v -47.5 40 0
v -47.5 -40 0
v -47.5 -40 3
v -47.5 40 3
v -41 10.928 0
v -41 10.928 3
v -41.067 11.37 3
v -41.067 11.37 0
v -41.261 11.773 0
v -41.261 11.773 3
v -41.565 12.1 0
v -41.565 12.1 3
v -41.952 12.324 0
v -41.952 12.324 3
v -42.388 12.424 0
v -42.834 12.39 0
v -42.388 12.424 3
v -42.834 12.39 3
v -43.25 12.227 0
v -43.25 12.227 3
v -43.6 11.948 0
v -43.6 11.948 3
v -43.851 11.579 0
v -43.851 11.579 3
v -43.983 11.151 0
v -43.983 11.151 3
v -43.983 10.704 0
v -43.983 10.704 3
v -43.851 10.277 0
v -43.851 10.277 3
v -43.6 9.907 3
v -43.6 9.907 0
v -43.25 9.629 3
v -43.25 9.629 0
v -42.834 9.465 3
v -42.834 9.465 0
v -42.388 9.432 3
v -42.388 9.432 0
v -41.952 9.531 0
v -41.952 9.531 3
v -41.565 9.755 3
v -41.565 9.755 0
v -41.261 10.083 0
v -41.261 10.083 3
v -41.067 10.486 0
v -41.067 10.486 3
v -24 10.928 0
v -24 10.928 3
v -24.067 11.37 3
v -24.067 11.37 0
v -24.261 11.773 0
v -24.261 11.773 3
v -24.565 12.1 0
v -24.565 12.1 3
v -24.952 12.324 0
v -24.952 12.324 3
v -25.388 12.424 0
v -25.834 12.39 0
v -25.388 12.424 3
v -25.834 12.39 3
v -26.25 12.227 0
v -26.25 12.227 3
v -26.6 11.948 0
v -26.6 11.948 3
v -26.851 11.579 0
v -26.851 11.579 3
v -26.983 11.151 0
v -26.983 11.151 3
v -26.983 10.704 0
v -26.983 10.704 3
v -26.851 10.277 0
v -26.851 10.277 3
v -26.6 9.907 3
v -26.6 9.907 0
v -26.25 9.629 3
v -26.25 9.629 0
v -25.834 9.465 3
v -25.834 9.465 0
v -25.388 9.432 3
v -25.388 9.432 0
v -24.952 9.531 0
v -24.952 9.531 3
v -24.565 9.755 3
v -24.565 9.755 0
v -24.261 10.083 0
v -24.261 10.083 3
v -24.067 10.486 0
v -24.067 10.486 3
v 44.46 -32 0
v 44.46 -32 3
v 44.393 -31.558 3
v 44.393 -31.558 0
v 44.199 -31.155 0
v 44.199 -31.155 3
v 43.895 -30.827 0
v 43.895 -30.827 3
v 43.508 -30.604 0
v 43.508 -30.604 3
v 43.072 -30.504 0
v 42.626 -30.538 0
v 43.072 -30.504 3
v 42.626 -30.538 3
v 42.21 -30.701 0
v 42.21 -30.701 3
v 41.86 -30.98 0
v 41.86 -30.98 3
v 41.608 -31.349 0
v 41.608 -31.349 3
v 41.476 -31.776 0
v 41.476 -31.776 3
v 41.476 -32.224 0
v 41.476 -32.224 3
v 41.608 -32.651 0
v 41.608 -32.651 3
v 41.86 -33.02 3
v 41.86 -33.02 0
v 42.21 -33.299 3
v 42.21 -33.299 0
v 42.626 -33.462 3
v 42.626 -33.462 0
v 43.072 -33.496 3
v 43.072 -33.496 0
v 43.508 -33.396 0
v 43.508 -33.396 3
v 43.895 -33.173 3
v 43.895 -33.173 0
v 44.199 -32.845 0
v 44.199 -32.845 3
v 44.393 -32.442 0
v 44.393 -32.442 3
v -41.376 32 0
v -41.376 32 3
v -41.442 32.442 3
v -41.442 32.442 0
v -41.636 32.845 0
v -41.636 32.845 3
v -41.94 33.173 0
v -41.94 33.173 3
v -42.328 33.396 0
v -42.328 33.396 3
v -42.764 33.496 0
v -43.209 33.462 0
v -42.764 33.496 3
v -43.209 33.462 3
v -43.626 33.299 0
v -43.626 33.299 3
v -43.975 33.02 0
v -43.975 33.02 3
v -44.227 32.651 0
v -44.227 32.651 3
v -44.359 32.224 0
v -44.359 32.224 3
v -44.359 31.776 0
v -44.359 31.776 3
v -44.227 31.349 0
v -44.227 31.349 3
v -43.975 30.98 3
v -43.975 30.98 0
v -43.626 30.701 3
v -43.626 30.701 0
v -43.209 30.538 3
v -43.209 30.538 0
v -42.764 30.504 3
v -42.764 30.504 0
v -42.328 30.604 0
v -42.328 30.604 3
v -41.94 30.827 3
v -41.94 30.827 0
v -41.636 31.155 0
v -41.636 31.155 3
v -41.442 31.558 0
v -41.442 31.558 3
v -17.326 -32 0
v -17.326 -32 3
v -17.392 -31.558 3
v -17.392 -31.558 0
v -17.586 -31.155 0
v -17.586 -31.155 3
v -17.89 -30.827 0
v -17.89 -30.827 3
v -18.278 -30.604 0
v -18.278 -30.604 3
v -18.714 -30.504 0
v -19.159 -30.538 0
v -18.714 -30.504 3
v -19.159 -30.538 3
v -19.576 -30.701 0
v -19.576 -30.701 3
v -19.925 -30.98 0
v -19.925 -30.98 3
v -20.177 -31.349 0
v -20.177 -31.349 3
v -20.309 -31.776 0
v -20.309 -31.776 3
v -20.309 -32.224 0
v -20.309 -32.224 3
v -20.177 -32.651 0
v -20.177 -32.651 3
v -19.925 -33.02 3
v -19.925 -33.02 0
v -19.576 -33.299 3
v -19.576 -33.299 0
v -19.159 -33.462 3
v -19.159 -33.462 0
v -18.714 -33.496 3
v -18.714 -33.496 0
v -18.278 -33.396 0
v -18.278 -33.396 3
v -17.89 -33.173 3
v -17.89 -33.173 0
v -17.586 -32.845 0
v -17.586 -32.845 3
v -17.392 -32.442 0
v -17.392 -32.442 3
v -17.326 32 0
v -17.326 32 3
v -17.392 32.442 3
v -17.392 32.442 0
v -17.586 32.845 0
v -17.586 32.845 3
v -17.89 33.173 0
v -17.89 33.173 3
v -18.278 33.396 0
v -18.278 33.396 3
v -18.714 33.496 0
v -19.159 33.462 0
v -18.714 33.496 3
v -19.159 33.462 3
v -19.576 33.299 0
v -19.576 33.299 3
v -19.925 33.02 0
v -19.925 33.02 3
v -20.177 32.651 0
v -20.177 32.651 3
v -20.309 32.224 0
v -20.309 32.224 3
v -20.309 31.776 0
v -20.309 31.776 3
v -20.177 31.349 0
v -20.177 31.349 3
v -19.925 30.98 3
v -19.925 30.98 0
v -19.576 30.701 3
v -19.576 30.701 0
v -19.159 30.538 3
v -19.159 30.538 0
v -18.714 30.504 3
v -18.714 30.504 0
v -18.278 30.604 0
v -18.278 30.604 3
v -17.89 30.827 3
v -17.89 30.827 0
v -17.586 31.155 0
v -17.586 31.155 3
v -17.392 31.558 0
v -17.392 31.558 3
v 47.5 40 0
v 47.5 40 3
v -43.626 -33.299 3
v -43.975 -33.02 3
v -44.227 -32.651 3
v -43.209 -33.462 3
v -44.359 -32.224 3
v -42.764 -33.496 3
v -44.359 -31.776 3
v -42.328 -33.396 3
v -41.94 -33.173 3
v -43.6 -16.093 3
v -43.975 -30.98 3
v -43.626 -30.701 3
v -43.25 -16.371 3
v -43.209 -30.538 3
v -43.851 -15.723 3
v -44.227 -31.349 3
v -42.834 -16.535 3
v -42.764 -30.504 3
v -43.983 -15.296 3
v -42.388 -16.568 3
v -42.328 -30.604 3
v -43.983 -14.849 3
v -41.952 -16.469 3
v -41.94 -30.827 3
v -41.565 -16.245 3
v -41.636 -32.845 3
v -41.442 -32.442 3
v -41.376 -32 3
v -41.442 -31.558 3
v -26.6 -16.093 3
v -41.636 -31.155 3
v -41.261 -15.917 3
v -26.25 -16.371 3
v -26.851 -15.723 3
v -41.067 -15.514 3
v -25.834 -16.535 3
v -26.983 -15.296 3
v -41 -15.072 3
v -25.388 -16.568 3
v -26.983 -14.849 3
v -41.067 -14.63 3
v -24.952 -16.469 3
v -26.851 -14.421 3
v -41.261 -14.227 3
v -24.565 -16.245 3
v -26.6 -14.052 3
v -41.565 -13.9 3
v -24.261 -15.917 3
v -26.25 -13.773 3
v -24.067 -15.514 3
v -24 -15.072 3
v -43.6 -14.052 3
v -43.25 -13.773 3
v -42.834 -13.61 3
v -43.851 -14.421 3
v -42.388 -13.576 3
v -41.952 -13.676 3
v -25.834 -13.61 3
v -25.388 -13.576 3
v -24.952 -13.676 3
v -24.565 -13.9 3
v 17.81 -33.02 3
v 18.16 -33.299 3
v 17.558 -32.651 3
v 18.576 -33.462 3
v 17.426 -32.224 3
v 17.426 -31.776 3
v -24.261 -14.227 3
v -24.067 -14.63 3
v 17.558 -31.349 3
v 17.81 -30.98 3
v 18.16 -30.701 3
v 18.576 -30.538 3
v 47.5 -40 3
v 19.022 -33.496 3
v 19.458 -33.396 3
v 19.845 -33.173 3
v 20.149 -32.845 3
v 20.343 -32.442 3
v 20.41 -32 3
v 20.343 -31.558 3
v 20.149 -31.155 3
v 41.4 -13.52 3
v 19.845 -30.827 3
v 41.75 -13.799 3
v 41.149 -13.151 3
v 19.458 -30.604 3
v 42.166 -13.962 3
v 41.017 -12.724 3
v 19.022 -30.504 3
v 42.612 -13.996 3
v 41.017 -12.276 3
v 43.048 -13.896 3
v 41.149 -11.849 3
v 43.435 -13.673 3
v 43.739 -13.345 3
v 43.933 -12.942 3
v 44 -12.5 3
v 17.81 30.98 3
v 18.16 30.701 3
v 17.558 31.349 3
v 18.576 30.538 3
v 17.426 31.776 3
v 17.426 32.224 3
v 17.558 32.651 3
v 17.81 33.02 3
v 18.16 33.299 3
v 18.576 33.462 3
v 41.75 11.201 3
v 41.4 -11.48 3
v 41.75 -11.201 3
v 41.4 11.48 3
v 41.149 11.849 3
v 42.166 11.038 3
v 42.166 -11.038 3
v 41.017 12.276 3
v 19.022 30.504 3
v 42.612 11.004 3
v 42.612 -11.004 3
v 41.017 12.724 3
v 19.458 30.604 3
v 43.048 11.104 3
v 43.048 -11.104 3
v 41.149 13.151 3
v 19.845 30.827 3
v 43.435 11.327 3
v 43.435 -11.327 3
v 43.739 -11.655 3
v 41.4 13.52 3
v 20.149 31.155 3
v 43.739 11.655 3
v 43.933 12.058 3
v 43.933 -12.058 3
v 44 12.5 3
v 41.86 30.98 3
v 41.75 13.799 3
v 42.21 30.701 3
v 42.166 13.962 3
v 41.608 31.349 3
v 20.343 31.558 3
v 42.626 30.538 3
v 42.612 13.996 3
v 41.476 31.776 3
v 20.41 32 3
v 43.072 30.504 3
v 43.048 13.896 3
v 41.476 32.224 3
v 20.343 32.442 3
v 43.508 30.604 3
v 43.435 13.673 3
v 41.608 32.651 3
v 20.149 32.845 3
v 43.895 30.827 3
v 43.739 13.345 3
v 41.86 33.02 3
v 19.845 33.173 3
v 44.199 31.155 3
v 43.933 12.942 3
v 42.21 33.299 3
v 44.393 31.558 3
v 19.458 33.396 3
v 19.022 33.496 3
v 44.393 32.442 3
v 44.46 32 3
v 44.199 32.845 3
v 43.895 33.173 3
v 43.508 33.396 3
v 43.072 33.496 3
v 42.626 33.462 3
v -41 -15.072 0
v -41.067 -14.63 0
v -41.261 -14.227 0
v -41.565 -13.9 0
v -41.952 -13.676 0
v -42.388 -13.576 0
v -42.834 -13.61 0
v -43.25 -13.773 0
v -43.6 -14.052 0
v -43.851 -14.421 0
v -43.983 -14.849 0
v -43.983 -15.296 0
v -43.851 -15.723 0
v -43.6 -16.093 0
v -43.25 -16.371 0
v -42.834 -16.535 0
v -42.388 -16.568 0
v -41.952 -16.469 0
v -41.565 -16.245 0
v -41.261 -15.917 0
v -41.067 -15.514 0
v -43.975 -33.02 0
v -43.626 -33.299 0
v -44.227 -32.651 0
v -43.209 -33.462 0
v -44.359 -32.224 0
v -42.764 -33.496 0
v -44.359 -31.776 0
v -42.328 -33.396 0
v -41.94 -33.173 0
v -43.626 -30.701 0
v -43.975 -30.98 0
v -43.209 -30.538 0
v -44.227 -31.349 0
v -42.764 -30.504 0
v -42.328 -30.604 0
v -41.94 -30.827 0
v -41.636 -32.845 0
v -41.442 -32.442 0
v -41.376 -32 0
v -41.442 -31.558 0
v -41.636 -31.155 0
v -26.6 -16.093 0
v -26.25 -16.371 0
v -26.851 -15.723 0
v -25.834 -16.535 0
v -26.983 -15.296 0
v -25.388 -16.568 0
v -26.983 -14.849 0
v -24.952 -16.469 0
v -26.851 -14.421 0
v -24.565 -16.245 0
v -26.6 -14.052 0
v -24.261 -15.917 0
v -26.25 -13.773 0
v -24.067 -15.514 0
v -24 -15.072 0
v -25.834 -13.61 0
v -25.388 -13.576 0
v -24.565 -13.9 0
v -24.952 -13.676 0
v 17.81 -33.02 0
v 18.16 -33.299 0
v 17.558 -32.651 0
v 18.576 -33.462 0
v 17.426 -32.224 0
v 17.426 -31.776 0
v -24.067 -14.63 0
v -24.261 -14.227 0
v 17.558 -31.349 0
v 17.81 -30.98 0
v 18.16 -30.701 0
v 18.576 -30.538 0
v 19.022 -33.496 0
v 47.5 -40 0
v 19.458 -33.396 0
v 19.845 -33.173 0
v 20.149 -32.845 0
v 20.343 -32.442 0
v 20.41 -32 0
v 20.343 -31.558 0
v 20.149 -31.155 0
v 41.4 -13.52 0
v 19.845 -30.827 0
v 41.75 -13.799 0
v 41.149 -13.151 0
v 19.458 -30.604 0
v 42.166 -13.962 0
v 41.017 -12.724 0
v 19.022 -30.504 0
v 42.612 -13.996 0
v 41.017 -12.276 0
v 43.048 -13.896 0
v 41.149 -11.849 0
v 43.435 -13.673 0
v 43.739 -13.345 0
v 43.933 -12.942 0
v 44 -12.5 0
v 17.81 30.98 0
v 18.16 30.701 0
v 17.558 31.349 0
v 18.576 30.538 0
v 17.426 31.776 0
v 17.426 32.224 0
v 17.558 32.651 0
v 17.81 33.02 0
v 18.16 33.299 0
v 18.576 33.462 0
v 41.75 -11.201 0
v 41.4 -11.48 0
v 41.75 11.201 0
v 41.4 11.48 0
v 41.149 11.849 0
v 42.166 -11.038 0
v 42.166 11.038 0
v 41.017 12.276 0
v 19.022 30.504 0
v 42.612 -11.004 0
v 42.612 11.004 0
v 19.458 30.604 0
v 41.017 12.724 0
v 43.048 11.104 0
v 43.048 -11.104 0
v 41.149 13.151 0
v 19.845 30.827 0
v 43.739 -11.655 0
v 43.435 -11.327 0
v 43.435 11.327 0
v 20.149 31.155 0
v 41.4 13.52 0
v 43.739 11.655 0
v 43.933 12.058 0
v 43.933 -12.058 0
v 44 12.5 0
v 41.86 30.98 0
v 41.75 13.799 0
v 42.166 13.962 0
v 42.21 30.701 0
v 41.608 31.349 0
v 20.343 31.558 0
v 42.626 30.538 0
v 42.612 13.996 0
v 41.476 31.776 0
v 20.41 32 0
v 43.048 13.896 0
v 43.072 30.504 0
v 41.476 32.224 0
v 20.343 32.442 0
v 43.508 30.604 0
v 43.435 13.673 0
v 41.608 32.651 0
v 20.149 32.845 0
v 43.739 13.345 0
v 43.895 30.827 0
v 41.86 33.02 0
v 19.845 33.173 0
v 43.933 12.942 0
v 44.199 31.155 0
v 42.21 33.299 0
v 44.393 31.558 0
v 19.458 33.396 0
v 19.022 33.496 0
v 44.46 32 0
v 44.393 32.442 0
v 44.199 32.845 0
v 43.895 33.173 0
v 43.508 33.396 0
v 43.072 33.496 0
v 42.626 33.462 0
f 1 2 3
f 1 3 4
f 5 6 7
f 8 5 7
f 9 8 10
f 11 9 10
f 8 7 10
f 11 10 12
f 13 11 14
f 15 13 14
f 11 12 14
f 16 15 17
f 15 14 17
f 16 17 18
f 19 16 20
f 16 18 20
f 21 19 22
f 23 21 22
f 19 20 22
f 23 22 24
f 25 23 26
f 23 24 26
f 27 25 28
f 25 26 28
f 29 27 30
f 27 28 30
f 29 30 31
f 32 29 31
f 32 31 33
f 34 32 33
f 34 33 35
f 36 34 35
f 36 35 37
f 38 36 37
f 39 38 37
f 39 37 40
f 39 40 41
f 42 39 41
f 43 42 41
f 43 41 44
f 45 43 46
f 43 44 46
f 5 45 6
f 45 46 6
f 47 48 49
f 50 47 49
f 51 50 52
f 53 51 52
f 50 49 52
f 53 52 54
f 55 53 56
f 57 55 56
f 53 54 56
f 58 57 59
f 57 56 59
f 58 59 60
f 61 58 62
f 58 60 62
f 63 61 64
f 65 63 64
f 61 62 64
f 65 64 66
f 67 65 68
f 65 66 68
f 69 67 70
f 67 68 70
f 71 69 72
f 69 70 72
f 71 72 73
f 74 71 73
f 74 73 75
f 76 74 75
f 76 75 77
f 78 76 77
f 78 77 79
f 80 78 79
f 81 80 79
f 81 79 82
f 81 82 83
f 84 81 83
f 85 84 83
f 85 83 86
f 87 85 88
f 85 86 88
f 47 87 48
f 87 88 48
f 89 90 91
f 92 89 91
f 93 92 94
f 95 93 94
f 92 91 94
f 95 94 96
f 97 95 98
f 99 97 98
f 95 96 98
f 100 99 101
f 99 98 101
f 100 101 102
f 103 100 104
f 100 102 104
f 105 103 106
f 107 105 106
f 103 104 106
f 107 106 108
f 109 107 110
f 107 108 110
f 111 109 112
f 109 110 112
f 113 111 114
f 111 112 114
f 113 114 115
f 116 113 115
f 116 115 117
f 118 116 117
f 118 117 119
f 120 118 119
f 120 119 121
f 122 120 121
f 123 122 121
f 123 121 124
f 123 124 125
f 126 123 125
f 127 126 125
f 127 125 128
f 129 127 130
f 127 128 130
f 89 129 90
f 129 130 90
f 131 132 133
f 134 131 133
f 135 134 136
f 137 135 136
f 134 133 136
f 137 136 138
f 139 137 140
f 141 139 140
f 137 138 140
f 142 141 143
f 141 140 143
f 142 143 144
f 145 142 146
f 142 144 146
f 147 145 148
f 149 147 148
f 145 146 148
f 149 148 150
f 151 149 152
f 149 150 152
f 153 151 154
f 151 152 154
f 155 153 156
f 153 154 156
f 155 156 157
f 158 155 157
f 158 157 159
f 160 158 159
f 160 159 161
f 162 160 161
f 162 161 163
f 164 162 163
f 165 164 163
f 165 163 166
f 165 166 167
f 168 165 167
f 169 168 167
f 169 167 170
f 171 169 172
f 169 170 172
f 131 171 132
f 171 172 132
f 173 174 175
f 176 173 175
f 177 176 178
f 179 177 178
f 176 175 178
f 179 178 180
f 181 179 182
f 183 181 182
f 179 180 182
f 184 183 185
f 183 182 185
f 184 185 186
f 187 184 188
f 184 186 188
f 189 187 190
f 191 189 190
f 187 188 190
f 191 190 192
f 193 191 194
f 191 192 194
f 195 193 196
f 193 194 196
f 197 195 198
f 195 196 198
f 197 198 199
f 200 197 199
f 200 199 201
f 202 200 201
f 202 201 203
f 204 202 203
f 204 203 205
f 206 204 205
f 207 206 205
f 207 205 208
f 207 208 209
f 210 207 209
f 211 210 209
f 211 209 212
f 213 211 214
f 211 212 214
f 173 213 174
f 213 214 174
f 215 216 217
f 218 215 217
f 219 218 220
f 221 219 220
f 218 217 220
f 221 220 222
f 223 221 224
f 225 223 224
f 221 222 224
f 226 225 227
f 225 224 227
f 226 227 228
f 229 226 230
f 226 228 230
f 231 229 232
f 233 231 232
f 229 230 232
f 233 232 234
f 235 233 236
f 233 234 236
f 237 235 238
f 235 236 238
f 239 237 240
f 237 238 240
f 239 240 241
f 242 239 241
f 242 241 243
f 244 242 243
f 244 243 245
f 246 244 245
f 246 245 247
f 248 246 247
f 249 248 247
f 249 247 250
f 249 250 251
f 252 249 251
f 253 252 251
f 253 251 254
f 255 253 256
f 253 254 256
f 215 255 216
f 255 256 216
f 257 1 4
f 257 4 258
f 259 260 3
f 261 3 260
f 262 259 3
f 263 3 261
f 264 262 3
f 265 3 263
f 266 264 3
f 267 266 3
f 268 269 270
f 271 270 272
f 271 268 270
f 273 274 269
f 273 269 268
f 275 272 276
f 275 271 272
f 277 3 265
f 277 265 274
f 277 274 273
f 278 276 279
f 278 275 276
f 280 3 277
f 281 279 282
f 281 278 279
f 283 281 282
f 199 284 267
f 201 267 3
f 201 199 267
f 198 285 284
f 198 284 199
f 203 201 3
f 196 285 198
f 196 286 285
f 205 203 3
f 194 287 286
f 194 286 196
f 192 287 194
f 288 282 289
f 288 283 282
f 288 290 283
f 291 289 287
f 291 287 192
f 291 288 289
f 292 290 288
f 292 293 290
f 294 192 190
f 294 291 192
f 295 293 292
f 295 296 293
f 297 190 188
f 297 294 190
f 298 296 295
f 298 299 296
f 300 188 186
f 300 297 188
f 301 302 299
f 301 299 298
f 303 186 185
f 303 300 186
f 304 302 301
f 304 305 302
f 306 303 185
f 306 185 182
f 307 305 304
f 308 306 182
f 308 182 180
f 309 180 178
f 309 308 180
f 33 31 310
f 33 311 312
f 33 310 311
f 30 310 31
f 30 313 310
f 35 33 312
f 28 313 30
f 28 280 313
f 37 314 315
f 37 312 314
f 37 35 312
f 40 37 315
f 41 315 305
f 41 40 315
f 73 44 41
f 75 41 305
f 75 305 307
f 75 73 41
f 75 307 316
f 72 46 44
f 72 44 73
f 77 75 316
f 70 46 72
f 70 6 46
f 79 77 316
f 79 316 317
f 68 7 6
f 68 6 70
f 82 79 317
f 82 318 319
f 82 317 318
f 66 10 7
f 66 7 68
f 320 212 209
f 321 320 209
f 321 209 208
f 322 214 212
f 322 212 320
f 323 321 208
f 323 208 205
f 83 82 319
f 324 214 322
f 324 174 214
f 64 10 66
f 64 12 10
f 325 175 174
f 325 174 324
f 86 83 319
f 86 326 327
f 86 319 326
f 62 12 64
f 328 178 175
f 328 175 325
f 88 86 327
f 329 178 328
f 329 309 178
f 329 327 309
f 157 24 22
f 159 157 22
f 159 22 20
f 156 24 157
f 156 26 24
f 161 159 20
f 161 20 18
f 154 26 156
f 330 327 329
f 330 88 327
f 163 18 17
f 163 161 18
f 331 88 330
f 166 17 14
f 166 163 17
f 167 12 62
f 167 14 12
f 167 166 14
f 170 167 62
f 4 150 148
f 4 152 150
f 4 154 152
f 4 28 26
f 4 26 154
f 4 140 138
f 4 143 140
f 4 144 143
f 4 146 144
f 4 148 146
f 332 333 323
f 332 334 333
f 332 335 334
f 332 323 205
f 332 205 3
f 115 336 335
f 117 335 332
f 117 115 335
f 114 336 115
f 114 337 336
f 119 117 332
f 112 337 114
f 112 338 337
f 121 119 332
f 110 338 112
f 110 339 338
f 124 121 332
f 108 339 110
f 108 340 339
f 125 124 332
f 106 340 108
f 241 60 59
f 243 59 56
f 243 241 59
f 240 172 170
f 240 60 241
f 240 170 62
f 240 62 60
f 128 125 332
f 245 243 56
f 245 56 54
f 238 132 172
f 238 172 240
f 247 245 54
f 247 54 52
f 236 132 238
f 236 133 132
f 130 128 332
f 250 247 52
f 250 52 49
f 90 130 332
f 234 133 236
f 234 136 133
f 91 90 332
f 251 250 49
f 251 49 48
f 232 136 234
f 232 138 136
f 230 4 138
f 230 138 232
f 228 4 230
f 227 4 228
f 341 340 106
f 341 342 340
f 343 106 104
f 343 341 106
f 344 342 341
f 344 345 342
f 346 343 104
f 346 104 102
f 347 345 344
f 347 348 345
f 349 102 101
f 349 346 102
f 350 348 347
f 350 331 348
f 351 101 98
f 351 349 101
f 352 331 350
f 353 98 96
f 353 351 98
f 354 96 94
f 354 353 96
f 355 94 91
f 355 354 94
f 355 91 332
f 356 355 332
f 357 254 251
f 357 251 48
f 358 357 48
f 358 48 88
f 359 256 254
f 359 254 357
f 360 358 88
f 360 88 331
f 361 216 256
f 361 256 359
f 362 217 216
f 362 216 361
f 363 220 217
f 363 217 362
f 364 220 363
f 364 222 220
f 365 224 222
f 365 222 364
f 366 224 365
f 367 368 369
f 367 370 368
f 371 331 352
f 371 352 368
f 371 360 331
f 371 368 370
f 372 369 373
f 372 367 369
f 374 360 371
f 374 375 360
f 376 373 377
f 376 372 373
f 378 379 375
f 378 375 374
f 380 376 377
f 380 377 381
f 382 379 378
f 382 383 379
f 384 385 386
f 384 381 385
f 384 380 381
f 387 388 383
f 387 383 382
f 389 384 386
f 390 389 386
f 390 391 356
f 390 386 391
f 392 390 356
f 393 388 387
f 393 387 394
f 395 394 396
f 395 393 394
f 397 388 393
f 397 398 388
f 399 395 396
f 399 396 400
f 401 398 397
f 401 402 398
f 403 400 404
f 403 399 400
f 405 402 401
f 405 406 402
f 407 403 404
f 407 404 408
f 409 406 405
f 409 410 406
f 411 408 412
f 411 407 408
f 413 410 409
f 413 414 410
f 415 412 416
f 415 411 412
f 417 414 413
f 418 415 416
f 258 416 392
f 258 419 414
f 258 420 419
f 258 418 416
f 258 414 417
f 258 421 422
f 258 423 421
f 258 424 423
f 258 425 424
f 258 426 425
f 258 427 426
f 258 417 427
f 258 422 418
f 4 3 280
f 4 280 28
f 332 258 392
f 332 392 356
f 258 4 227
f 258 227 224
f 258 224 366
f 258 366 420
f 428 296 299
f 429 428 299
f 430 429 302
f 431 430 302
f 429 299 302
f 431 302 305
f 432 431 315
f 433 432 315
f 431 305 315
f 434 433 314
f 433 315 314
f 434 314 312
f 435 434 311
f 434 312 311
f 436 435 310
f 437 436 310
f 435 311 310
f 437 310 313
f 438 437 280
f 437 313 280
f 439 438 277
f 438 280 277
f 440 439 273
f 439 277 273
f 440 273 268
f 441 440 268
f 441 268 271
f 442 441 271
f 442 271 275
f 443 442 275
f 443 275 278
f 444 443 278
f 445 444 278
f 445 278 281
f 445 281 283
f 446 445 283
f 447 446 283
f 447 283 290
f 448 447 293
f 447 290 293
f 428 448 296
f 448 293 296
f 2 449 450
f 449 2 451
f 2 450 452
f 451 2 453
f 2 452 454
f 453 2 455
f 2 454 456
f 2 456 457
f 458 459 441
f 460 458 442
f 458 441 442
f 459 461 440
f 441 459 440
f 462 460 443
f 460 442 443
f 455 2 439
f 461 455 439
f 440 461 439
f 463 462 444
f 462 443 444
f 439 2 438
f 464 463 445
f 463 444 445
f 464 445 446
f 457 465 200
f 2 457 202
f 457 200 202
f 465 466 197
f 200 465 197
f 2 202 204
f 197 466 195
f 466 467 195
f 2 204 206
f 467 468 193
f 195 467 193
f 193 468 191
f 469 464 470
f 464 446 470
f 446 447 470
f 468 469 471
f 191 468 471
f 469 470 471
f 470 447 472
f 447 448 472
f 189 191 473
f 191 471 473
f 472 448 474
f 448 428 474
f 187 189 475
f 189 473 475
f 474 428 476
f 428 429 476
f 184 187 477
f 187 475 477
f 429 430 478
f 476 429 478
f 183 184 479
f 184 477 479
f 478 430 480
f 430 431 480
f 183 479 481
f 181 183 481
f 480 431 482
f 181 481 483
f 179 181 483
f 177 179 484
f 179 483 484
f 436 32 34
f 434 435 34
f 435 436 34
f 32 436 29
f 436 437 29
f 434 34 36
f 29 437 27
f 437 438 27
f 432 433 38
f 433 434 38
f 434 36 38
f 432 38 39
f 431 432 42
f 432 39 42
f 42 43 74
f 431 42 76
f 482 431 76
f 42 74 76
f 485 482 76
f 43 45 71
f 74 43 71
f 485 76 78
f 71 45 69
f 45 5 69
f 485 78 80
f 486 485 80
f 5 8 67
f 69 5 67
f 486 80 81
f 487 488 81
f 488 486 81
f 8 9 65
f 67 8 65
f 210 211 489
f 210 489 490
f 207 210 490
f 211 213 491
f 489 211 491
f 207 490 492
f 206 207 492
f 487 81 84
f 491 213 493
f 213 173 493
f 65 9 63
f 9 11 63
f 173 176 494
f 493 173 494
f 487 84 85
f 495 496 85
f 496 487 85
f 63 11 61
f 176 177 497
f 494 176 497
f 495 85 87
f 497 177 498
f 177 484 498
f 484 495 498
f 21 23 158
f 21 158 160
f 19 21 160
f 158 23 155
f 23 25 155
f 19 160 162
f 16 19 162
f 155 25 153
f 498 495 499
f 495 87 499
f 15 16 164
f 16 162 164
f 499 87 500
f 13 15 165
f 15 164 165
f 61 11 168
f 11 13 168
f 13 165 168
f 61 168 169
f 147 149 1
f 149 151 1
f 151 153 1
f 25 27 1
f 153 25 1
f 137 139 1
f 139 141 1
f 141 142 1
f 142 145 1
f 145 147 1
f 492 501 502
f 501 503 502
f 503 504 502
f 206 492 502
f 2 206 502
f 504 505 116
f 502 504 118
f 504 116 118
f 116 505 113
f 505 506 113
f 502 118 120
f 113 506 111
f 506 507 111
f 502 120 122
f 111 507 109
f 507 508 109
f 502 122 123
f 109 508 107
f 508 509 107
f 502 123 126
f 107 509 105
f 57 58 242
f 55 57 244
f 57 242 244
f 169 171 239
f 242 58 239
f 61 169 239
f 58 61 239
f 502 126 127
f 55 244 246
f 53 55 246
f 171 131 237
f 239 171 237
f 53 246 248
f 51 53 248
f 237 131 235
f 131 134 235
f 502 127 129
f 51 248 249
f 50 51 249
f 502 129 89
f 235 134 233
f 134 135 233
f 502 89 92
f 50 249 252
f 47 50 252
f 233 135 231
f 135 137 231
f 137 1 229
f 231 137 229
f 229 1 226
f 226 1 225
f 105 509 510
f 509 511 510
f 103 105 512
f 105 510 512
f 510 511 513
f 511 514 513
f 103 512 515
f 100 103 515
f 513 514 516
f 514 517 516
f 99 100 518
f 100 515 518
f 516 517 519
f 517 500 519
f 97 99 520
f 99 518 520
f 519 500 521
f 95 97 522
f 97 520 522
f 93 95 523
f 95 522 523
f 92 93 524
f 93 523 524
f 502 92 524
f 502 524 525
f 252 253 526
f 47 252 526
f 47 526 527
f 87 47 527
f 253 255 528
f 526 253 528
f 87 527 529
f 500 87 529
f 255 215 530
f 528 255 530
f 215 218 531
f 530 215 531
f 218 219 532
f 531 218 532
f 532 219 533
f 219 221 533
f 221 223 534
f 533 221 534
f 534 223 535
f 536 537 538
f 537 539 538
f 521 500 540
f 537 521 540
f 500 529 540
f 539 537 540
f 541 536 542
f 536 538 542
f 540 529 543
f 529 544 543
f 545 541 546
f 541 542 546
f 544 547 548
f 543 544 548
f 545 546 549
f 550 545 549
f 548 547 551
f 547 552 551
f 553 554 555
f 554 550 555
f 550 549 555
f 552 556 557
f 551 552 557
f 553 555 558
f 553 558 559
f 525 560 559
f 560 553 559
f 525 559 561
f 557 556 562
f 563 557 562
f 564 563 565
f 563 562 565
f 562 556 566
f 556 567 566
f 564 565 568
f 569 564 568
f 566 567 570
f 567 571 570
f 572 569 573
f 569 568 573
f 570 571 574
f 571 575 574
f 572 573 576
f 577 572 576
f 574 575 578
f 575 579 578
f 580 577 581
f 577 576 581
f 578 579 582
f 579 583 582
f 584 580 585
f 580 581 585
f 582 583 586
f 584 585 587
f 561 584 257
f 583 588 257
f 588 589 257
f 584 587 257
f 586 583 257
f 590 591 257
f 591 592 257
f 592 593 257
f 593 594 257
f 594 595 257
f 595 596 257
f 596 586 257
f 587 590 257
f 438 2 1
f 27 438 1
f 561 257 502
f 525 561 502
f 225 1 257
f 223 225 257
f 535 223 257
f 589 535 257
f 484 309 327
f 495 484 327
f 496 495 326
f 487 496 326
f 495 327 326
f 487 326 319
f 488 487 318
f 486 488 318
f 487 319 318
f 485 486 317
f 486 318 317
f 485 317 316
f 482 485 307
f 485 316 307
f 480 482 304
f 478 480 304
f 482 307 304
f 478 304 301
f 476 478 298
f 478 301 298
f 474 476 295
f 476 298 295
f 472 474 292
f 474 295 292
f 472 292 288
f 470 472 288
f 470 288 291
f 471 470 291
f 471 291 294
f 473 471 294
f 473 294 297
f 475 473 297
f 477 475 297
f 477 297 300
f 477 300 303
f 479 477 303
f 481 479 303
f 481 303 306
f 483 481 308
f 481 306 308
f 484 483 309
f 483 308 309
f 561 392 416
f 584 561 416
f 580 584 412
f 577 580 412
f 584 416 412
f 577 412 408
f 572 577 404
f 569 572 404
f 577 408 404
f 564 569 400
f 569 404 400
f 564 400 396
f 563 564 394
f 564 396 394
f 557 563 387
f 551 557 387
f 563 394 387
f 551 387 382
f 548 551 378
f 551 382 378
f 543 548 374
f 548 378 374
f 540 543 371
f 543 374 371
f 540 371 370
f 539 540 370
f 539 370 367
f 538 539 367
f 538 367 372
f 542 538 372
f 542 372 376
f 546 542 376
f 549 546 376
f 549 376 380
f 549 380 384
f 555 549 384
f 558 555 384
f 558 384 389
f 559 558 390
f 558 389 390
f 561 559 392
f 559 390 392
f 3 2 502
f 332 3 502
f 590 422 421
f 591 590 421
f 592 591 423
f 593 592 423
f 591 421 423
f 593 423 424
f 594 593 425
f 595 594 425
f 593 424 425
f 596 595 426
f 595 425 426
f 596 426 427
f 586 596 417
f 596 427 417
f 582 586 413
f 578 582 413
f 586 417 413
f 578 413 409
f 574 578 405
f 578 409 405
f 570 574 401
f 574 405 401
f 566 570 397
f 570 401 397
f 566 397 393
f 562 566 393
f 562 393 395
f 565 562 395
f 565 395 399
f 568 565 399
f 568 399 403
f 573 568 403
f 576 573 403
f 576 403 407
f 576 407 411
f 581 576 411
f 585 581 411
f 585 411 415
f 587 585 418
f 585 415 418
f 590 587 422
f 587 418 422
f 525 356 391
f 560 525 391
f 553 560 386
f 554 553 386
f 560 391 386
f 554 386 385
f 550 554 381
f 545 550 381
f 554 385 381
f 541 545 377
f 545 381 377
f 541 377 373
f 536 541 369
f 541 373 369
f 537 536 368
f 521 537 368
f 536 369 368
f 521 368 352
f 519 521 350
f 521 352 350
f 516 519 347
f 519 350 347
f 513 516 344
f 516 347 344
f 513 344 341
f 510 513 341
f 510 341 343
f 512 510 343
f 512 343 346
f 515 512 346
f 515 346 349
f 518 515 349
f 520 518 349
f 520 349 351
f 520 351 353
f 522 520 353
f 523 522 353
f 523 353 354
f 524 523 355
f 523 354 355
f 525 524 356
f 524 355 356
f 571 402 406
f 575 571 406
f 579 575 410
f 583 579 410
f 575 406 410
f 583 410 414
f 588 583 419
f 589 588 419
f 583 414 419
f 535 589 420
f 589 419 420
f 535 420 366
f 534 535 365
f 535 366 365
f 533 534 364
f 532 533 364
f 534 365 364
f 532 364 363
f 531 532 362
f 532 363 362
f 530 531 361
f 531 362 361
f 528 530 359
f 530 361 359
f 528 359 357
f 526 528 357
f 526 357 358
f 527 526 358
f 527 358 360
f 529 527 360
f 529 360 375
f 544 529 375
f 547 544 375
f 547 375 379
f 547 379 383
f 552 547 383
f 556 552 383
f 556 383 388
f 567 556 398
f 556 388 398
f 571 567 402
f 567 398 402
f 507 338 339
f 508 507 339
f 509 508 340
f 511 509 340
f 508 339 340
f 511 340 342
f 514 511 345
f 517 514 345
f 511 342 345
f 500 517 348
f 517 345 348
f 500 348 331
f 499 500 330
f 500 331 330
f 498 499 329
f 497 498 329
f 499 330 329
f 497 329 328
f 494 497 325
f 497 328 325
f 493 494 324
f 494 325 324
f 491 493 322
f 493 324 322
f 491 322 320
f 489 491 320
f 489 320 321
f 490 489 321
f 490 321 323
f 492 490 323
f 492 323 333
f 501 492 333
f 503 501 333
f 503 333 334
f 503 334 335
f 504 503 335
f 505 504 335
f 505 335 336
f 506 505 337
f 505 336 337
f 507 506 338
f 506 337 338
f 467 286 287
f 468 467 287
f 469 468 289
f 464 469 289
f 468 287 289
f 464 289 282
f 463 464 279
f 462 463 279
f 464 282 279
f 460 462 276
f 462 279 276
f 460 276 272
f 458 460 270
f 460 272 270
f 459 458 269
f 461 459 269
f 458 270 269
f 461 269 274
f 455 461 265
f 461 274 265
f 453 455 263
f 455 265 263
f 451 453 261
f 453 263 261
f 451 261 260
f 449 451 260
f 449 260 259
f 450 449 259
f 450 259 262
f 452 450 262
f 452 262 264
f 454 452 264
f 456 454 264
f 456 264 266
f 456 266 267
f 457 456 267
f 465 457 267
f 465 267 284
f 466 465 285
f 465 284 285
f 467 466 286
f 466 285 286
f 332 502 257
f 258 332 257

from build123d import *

# Parameters (mm, degrees)
SKETCH1_W           = 95
SKETCH1_H           = 80
BOSS_EXTRUDE1_DEPTH = 3
SKETCH2_R           = 1.5
CUT_EXTRUDE1_DEPTH  = 3


with BuildPart() as part:
    # Sketch1 → Boss-Extrude1 (new body)
    with BuildSketch(Plane.XY):
        Rectangle(SKETCH1_W, SKETCH1_H)
    extrude(amount=BOSS_EXTRUDE1_DEPTH)

    # Sketch2 → Cut-Extrude1 (cut)
    with BuildSketch(Plane.XY.offset(3)):
        with Locations((-42.875692348, -32)):
            Circle(SKETCH2_R)
        with Locations((-18.825692348, -32)):
            Circle(SKETCH2_R)
        with Locations((-42.875692348, 32)):
            Circle(SKETCH2_R)
        with Locations((-18.825692348, 32)):
            Circle(SKETCH2_R)
        with Locations((-42.5, 10.92769595)):
            Circle(SKETCH2_R)
        with Locations((-25.5, 10.92769595)):
            Circle(SKETCH2_R)
        with Locations((-42.5, -15.07230405)):
            Circle(SKETCH2_R)
        with Locations((-25.5, -15.07230405)):
            Circle(SKETCH2_R)
        with Locations((42.5, -12.5)):
            Circle(SKETCH2_R)
        with Locations((42.5, 12.5)):
            Circle(SKETCH2_R)
        with Locations((18.909687324, 32)):
            Circle(SKETCH2_R)
        with Locations((42.959687324, 32)):
            Circle(SKETCH2_R)
        with Locations((18.909687324, -32)):
            Circle(SKETCH2_R)
        with Locations((42.959687324, -32)):
            Circle(SKETCH2_R)
    extrude(amount=-CUT_EXTRUDE1_DEPTH, mode=Mode.SUBTRACT)


solid = part.part
